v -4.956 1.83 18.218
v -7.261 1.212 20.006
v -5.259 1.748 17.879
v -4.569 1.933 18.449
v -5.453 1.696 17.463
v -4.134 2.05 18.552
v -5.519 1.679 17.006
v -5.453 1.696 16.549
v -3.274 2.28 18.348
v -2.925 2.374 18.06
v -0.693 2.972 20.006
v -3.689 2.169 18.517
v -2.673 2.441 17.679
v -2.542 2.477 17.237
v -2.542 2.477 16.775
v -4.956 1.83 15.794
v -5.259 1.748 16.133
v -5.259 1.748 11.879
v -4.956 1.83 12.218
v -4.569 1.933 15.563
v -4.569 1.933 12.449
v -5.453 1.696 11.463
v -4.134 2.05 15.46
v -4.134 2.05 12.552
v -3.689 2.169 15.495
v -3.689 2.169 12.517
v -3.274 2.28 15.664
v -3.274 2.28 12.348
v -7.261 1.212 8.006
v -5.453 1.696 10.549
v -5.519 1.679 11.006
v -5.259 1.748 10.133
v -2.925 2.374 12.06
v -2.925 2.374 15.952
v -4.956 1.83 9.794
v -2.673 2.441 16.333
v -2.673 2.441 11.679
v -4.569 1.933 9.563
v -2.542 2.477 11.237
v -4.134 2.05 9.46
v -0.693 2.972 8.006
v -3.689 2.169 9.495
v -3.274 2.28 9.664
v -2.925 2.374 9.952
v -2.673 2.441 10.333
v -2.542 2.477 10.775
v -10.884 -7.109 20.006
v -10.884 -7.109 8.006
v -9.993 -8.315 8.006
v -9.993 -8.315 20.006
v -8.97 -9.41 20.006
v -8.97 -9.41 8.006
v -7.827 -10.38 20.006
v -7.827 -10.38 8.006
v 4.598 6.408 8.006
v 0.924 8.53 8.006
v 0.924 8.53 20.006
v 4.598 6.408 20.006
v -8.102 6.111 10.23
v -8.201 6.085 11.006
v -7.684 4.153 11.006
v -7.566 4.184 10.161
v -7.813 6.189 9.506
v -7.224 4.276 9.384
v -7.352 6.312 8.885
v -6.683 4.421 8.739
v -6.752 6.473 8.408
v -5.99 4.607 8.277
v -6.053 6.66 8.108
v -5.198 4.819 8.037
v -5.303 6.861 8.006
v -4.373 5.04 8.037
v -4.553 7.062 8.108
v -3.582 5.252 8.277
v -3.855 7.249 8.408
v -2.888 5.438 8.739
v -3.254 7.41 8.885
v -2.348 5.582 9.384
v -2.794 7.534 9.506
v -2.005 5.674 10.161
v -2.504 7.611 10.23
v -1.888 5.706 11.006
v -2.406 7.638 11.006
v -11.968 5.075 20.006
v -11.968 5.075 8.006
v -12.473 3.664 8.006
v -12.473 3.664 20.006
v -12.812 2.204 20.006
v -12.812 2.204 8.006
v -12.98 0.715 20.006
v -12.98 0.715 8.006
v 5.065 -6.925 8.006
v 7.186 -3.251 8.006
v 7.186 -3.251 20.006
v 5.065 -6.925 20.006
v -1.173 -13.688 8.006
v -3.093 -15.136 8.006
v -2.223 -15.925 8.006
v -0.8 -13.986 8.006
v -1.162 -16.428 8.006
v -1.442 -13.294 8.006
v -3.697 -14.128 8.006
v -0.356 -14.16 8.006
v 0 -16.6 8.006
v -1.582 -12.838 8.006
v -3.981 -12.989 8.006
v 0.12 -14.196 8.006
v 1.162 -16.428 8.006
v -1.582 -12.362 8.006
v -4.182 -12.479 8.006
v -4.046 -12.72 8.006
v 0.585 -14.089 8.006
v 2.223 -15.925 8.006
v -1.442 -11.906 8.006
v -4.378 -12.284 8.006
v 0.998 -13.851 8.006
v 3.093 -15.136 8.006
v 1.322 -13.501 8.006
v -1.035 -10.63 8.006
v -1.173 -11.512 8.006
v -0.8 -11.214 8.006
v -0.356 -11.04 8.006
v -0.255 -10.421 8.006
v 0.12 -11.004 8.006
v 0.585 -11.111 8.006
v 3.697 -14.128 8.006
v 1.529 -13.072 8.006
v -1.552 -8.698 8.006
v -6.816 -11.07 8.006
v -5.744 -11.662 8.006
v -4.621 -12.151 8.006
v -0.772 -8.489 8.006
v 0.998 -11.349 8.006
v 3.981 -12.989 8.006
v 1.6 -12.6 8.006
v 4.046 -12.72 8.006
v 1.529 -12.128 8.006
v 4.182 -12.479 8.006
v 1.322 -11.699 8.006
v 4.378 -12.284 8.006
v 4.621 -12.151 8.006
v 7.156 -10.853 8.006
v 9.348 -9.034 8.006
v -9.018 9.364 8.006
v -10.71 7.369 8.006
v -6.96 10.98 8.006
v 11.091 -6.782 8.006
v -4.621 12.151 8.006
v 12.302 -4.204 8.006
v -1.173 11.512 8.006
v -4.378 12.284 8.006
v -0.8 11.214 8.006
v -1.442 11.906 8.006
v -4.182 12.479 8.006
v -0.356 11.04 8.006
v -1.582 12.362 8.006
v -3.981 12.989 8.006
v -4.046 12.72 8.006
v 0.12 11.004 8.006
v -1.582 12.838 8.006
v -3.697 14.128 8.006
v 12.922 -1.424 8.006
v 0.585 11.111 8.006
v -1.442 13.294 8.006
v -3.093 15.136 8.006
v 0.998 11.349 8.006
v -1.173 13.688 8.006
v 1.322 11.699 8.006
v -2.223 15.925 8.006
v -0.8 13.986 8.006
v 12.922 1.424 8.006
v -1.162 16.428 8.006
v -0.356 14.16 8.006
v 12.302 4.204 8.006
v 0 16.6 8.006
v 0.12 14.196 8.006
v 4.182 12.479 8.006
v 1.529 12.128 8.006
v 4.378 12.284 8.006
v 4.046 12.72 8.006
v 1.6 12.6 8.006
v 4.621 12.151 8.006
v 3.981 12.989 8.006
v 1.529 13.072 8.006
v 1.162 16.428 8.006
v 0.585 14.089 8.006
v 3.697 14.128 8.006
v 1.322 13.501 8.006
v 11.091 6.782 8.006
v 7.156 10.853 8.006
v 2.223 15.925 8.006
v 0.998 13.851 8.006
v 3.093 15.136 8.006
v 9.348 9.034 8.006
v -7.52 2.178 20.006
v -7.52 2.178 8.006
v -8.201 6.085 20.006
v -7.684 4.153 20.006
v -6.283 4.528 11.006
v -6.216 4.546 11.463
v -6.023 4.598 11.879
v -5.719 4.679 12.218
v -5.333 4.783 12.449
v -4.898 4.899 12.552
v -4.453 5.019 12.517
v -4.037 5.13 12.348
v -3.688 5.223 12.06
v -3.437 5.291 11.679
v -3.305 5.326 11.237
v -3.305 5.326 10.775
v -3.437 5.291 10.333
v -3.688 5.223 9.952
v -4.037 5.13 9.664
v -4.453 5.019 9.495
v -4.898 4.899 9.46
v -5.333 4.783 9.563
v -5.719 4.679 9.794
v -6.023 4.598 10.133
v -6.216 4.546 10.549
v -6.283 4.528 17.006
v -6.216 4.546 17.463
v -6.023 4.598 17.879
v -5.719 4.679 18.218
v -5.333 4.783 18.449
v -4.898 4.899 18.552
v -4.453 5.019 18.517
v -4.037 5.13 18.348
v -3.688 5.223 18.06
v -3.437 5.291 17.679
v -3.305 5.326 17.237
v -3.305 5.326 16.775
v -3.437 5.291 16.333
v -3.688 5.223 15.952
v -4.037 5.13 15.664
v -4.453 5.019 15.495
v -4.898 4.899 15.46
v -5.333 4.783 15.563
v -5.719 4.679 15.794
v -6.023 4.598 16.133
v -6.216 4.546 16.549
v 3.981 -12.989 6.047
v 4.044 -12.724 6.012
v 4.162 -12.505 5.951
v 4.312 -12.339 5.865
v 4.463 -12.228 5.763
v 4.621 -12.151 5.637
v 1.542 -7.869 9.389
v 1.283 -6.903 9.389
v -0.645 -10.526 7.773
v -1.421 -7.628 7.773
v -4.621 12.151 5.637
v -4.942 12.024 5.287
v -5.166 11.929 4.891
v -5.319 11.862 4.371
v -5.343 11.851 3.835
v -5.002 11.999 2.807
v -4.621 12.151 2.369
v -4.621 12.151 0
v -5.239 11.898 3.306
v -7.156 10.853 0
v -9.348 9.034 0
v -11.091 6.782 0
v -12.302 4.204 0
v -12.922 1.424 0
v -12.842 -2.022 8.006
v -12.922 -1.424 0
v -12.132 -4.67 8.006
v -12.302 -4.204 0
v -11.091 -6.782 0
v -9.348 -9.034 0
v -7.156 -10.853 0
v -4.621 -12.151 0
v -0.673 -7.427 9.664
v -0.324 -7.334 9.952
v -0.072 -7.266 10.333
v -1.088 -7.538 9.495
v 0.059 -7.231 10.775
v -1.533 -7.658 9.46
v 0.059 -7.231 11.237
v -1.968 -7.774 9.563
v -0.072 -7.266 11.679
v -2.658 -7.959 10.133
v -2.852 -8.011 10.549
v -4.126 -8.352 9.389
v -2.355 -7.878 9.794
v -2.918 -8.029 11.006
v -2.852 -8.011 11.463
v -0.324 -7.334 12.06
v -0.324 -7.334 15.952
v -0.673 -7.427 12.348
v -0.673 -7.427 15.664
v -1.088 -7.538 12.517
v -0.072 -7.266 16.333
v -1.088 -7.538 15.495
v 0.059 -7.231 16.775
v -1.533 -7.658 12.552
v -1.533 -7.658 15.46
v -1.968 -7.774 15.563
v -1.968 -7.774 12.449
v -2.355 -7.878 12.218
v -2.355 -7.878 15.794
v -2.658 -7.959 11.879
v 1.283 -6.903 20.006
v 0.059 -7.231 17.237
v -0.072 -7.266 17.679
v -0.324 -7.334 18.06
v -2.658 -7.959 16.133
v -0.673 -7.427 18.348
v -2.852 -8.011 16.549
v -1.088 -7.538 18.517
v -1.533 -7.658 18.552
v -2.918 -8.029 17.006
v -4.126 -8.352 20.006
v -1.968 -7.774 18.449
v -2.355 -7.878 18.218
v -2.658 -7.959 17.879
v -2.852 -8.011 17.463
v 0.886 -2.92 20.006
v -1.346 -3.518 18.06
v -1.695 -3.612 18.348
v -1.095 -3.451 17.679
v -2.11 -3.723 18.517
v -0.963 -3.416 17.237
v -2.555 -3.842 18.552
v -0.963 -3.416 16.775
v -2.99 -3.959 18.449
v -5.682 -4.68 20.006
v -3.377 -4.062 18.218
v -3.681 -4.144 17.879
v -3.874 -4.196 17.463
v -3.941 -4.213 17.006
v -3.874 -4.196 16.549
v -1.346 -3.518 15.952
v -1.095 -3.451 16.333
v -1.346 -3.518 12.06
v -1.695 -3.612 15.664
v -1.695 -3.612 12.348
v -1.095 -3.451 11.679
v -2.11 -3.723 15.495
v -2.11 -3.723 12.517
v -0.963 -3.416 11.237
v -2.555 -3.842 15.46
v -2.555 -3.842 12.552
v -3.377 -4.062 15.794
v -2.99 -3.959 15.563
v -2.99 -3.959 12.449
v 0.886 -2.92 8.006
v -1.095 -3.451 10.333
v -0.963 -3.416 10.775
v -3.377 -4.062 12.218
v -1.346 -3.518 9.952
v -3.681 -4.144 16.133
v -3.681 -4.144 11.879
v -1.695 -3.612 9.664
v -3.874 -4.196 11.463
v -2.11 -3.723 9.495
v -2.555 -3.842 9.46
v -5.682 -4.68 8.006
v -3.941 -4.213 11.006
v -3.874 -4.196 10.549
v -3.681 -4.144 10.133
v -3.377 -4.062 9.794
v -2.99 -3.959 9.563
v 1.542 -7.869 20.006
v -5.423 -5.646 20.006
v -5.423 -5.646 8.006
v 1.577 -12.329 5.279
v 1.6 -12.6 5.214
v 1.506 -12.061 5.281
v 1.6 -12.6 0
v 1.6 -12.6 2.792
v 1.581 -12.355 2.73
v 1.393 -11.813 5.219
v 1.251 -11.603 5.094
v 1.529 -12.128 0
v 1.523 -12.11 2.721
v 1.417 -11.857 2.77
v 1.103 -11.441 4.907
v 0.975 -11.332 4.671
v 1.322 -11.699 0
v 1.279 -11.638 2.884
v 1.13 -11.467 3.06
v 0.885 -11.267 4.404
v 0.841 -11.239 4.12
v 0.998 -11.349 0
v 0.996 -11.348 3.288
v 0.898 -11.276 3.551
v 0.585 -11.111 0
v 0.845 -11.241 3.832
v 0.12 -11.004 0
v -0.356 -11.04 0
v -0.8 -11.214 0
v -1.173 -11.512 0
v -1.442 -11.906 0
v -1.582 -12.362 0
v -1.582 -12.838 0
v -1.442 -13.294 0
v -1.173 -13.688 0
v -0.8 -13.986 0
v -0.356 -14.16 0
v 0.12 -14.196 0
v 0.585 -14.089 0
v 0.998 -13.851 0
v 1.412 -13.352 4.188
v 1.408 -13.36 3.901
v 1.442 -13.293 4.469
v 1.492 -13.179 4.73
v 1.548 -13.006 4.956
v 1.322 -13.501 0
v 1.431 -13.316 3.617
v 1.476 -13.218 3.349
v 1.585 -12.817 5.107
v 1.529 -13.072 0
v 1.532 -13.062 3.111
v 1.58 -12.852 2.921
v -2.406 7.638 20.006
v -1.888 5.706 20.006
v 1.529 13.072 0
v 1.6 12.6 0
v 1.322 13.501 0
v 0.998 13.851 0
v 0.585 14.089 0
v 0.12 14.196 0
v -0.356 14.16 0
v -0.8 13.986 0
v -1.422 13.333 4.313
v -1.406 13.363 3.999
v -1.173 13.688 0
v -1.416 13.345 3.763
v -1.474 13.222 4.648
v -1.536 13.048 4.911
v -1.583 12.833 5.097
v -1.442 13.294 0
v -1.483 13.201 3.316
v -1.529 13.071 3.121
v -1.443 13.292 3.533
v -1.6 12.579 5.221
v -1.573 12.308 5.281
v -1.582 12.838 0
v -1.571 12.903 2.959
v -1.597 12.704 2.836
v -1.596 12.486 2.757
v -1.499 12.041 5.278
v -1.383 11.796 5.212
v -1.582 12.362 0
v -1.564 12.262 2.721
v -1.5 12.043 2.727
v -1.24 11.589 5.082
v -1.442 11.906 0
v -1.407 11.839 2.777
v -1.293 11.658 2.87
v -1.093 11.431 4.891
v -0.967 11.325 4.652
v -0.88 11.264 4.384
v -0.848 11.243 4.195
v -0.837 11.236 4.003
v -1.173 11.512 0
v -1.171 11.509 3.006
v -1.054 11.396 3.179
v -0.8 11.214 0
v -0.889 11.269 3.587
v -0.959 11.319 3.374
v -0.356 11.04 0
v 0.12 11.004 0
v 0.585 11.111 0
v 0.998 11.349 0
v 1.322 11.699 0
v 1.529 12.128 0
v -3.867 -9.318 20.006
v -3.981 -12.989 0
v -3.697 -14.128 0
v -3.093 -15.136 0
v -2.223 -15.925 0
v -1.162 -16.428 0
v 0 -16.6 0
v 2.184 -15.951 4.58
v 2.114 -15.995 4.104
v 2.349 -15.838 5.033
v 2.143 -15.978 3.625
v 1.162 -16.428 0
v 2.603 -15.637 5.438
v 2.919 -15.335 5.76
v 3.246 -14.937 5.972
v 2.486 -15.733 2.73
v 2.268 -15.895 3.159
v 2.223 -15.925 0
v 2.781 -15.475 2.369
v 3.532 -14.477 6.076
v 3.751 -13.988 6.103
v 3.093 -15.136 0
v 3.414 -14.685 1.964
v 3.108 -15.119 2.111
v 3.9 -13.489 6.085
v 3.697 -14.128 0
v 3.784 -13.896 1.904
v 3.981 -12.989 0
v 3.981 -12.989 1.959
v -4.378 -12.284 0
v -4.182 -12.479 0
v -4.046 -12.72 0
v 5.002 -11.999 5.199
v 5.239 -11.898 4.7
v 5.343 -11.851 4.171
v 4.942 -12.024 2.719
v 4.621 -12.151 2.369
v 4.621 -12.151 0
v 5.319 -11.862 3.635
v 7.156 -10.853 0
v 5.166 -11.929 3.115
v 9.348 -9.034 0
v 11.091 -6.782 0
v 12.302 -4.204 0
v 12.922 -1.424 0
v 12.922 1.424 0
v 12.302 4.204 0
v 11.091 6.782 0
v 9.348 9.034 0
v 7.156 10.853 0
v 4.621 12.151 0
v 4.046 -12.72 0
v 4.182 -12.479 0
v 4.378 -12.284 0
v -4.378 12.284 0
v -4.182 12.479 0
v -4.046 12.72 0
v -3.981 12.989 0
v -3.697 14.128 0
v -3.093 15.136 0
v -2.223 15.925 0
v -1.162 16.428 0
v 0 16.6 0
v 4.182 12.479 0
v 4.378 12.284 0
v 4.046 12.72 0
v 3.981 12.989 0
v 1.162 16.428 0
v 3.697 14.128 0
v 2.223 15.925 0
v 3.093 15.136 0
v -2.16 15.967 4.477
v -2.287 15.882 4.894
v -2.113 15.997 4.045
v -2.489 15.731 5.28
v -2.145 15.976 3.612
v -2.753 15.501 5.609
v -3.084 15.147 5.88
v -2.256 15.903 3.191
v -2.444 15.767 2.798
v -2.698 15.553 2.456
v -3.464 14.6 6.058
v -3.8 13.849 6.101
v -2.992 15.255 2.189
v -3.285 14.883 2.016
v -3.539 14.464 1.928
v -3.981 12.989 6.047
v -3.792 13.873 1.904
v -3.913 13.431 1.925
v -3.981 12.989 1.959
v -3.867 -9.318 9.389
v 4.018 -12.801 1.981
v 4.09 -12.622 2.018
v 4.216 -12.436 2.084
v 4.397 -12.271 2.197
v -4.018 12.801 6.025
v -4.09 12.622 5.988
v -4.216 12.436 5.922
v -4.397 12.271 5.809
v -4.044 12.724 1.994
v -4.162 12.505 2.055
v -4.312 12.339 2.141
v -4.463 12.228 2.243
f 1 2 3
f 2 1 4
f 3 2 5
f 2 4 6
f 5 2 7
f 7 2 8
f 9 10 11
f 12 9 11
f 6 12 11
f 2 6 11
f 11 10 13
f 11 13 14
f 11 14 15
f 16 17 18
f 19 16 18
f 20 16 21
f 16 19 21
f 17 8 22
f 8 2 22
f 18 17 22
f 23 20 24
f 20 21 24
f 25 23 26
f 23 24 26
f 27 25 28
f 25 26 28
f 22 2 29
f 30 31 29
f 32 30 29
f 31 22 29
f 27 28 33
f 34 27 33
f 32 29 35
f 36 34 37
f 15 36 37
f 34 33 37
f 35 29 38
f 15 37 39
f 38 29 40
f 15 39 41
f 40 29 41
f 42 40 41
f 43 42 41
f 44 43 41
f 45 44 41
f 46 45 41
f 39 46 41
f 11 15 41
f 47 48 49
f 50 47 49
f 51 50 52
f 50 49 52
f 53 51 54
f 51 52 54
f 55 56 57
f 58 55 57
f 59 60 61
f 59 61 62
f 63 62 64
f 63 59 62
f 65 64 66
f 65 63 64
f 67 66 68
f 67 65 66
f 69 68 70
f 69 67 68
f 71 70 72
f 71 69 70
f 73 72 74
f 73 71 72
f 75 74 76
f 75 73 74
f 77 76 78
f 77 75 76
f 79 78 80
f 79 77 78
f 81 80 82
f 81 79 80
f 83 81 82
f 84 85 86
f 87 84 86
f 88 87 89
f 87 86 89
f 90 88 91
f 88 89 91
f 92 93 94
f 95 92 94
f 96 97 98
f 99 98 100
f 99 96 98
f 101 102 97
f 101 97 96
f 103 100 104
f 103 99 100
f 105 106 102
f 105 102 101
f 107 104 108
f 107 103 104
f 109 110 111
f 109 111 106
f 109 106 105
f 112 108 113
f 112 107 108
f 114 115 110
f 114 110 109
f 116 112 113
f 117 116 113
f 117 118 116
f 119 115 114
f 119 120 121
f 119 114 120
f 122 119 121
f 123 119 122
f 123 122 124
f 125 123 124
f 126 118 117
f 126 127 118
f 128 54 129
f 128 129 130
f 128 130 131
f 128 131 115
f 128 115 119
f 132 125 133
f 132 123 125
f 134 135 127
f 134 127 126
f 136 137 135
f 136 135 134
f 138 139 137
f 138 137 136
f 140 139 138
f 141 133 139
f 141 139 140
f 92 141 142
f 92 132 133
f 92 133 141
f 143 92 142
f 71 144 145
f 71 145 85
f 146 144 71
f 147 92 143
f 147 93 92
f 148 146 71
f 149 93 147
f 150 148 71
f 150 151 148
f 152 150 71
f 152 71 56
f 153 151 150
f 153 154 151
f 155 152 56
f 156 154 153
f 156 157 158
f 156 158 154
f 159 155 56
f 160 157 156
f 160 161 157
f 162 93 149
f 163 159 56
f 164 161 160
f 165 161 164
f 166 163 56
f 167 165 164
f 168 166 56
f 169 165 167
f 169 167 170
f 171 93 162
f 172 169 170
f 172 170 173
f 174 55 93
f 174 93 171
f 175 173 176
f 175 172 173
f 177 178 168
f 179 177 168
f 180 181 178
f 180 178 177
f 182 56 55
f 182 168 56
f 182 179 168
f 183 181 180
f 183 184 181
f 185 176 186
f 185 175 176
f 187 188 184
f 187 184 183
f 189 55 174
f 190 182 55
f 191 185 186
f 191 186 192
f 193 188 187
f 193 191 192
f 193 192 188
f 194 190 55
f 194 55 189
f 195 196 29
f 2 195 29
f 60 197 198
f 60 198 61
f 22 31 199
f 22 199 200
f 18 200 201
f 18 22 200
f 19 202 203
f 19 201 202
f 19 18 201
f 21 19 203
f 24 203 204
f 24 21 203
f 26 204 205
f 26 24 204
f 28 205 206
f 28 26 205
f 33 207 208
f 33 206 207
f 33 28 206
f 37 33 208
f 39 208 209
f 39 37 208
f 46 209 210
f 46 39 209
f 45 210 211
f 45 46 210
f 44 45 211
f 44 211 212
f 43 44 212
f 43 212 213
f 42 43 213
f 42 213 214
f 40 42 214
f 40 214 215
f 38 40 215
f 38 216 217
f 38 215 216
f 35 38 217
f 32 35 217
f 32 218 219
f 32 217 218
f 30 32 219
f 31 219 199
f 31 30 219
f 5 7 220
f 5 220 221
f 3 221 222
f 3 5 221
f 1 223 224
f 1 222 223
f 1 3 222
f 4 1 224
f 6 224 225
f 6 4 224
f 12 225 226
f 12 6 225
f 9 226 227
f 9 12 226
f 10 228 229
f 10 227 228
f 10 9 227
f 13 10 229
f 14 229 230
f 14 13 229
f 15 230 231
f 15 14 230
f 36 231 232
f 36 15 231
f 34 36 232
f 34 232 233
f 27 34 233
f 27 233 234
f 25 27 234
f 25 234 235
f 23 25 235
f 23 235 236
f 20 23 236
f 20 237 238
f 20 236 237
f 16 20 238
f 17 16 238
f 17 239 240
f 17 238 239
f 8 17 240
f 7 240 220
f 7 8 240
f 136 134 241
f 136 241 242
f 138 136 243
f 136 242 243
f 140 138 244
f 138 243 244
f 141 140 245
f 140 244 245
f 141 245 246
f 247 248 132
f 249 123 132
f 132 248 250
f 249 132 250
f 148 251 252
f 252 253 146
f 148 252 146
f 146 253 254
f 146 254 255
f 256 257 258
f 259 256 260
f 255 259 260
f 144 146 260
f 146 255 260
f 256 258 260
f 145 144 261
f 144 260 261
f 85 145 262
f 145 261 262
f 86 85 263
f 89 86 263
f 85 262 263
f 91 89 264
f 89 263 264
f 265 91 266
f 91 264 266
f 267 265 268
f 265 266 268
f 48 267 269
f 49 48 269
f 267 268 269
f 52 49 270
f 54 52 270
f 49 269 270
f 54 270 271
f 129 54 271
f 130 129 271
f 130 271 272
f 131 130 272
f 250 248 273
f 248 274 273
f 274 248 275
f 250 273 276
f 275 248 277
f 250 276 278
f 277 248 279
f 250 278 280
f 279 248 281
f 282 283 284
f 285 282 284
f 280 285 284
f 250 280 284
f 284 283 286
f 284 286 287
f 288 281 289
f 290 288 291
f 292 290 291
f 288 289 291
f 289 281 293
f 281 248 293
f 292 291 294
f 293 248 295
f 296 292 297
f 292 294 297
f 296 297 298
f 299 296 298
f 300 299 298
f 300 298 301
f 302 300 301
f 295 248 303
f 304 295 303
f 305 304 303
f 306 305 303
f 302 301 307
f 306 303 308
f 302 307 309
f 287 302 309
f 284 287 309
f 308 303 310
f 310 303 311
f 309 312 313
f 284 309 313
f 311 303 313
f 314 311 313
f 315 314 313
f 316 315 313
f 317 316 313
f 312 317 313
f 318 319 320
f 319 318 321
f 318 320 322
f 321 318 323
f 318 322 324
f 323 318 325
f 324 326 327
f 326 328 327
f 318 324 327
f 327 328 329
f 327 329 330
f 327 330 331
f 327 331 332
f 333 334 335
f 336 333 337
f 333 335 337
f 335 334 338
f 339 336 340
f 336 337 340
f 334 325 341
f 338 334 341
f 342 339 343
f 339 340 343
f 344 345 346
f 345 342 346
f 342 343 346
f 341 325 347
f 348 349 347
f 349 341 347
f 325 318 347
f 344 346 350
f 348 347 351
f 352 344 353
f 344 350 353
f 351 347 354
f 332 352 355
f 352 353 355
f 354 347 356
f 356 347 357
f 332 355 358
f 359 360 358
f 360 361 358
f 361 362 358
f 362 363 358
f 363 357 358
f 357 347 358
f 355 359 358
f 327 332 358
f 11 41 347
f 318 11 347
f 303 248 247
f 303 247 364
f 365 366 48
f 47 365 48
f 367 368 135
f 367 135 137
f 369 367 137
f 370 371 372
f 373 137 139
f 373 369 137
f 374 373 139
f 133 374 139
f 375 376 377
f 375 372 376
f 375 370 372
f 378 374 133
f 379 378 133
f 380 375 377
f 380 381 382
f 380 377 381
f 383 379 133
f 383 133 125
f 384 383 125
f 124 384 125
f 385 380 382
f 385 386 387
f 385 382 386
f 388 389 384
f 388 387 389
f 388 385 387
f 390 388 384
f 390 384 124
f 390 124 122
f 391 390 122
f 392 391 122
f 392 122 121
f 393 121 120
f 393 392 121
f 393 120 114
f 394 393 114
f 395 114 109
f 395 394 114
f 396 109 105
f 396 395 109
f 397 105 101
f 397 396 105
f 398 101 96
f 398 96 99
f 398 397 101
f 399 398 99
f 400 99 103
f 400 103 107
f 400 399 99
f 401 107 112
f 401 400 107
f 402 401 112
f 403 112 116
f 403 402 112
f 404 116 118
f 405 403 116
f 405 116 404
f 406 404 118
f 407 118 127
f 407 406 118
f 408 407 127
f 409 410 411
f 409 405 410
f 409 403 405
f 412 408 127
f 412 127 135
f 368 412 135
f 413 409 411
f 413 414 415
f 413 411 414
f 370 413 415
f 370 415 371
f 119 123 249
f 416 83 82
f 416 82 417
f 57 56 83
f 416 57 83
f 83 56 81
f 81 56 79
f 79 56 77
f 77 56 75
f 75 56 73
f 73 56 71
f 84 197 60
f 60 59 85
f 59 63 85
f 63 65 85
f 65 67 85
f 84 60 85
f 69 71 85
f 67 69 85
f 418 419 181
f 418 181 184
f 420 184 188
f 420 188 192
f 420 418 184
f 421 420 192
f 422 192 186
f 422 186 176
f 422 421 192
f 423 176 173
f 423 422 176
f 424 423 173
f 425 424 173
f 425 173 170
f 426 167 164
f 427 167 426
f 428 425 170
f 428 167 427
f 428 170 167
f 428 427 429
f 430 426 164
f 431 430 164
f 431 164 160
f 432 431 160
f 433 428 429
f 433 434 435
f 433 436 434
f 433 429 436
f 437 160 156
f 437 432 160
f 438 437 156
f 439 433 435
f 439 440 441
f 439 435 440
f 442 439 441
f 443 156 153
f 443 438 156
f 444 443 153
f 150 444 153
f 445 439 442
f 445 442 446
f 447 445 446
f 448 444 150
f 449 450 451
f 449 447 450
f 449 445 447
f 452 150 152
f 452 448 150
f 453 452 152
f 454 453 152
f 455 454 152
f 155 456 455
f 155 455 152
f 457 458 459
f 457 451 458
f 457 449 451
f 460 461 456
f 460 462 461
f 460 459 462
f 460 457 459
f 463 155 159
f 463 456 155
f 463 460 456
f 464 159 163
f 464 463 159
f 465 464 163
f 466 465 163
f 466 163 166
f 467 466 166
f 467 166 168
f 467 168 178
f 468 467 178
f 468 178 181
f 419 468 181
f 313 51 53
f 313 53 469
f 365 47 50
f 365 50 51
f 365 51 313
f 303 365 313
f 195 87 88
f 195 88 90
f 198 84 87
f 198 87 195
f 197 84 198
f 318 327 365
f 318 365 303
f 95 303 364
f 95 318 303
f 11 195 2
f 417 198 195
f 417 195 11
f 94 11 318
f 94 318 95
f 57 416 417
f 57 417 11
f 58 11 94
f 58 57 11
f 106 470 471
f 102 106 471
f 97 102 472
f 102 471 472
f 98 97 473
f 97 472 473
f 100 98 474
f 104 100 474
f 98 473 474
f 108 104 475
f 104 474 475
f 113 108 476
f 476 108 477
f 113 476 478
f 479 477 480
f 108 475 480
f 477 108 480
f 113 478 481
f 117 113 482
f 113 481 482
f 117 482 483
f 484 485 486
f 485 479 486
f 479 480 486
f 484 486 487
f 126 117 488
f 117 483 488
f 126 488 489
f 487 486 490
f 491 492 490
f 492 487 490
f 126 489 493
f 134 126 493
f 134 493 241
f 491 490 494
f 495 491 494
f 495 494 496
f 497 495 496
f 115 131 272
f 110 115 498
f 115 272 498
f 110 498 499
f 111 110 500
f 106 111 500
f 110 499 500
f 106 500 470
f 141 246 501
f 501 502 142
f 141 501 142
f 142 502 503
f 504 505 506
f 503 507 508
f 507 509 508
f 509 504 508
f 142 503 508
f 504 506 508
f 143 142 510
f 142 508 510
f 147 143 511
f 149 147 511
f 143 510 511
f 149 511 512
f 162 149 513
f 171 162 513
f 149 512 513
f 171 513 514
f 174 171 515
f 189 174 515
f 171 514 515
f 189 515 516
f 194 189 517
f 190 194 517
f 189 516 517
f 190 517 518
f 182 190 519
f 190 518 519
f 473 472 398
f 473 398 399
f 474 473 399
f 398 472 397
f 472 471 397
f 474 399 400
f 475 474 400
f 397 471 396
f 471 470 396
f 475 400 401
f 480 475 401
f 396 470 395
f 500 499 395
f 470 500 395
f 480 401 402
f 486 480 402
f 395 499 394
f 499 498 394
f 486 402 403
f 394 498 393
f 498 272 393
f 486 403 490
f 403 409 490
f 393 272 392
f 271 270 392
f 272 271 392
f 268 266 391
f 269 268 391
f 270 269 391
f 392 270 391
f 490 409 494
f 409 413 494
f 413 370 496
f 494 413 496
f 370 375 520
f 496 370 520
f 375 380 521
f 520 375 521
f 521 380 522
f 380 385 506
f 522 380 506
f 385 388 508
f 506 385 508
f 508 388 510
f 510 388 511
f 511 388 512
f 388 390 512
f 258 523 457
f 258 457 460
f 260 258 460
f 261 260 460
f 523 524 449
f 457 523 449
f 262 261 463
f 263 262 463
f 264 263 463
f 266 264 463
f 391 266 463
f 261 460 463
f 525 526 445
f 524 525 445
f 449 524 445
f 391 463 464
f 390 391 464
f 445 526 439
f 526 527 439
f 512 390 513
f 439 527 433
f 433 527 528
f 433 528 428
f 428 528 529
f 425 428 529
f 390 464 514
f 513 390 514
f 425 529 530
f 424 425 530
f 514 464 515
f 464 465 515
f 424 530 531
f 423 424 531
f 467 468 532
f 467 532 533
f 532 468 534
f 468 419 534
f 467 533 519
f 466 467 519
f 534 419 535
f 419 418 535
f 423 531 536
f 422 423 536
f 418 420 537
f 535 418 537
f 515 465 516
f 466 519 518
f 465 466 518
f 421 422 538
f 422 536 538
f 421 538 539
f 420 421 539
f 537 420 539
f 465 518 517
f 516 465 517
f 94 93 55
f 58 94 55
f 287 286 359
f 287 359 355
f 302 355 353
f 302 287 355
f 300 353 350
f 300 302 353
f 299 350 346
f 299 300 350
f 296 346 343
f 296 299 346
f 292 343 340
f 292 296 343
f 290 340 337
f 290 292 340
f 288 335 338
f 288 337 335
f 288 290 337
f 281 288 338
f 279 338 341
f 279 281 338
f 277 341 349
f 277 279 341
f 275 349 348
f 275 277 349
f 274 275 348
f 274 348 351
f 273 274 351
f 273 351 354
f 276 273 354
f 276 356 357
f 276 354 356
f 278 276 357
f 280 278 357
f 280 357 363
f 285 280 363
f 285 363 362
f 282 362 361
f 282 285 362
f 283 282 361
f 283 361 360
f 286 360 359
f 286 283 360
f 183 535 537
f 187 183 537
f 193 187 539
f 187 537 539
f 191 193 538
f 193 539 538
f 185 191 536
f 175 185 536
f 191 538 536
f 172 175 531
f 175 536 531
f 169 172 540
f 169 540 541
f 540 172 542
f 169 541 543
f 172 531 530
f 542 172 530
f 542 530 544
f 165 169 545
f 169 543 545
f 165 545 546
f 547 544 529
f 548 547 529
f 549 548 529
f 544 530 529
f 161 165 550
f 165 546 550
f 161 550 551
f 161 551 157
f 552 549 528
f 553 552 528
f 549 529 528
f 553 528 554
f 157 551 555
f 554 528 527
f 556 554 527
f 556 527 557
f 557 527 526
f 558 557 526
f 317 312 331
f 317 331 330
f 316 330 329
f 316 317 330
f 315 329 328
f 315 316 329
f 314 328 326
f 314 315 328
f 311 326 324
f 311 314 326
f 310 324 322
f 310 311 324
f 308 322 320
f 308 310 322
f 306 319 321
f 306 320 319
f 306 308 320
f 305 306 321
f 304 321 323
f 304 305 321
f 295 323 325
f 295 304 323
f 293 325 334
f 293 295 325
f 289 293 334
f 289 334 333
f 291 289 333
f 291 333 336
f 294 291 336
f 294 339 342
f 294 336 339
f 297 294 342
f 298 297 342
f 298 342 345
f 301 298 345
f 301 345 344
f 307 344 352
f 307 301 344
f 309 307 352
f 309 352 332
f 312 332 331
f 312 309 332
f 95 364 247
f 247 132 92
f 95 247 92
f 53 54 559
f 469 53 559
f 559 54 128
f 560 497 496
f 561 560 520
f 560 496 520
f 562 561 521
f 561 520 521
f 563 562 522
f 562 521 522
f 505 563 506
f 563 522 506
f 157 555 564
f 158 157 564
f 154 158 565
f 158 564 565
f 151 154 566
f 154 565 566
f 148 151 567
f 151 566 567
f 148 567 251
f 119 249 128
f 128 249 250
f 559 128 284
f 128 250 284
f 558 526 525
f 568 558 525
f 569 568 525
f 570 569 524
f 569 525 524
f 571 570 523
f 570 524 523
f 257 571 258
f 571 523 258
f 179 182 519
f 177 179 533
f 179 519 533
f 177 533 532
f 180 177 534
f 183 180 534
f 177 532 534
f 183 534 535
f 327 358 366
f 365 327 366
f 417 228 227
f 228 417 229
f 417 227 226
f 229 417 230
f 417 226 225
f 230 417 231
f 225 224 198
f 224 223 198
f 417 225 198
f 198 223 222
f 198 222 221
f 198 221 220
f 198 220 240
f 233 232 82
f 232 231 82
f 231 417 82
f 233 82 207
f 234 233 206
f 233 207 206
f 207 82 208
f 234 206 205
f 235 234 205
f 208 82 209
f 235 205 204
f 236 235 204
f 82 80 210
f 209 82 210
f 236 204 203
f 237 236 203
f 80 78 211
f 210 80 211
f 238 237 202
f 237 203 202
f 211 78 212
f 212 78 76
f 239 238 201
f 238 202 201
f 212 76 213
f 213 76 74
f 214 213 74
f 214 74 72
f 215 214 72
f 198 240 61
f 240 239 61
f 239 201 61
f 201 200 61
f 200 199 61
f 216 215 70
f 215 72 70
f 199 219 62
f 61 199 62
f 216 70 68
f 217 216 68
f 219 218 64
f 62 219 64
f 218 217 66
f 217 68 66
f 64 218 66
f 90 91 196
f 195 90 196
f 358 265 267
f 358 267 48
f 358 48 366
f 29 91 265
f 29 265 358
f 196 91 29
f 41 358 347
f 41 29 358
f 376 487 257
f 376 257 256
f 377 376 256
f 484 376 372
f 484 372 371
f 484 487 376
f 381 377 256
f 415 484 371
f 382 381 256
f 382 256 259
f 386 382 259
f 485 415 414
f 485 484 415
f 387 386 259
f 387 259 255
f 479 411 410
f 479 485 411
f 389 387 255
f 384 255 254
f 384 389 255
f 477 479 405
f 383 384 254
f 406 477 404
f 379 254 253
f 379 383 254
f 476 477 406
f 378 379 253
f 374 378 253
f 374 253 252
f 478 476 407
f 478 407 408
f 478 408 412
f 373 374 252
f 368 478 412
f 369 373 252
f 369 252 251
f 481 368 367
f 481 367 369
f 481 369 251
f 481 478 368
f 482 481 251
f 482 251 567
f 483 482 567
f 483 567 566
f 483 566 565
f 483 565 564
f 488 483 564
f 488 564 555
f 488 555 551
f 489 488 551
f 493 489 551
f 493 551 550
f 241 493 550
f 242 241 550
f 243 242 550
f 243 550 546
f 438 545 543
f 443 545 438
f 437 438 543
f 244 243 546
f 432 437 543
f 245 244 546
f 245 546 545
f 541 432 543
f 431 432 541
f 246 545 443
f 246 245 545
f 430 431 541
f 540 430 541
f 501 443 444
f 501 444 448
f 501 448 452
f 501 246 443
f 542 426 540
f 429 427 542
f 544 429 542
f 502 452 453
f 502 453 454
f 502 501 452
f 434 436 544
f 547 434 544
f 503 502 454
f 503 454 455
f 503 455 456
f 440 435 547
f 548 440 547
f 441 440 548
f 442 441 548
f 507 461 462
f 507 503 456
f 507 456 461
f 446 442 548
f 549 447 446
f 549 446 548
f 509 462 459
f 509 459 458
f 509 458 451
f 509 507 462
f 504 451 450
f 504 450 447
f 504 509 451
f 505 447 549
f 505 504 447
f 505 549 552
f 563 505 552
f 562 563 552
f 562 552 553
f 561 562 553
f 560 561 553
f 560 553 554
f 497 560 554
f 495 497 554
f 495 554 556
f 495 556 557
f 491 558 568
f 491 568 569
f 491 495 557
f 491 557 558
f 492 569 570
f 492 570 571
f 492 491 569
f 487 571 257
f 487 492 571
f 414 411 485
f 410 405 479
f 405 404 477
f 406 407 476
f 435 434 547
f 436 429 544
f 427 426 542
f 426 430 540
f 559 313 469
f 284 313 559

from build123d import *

# Parameters (mm, degrees)
SKETCH1_R               = 1.6
BOSS_EXTRUDE1_DEPTH     = 8.00600005
CUT_EXTRUDE1_DEPTH      = 23.553404107
CUT_EXTRUDE1_DEPTH_BACK = 23.553404107
SKETCH3_R               = 2.1
BOSS_EXTRUDE2_DEPTH     = 12
CHAMFER1_SIZE           = 3
CUT_EXTRUDE4_DEPTH      = 35.916819883
CUT_EXTRUDE4_DEPTH_BACK = 35.916819883
SKETCH7_R               = 1.55
CUT_EXTRUDE5_DEPTH      = 2
CUT_EXTRUDE5_DEPTH_BACK = 1
CUT_EXTRUDE6_DEPTH      = 2


with BuildPart() as part:
    # Sketch1 → Boss-Extrude1 (new body)
    with BuildSketch(Plane.XY):
        with BuildLine():
            ThreePointArc((4.62089851, -12.151020408), (13, 0), (4.62089851, 12.151020408))
            ThreePointArc((4.62089851, 12.151020408), (4.181690754, 12.478661471), (3.981081793, 12.988571429))
            ThreePointArc((3.981081793, 12.988571429), (0, 16.6), (-3.981081793, 12.988571429))
            ThreePointArc((-3.981081793, 12.988571429), (-4.181690754, 12.478661471), (-4.62089851, 12.151020408))
            ThreePointArc((-4.62089851, 12.151020408), (-13, 0), (-4.62089851, -12.151020408))
            ThreePointArc((-4.62089851, -12.151020408), (-4.181690754, -12.478661471), (-3.981081793, -12.988571429))
            ThreePointArc((-3.981081793, -12.988571429), (0, -16.6), (3.981081793, -12.988571429))
            ThreePointArc((3.981081793, -12.988571429), (4.181690754, -12.478661471), (4.62089851, -12.151020408))
        make_face()
        with Locations((0, 12.6)):
            Circle(SKETCH1_R, mode=Mode.SUBTRACT)
        with Locations((0, -12.6)):
            Circle(SKETCH1_R, mode=Mode.SUBTRACT)
    extrude(amount=BOSS_EXTRUDE1_DEPTH)

    # Sketch3 → Cut-Extrude1 (cut, two sides: drawn at the far end of the back side and taken through both)
    with BuildSketch(Plane(origin=(0, 0, 0), x_dir=(0, 0, 1), z_dir=(-0.25881904510252135, 0.9659258262890681, 0)).offset(-CUT_EXTRUDE1_DEPTH_BACK)):
        with Locations((4.003000025, 0)):
            Circle(SKETCH3_R)
    extrude(amount=CUT_EXTRUDE1_DEPTH + CUT_EXTRUDE1_DEPTH_BACK, mode=Mode.SUBTRACT)

    # Sketch6 → Boss-Extrude2 (add)
    with BuildSketch(Plane.XY.offset(8.00600005)):
        with BuildLine():
            Line((-7.827242025, -10.379512623), (7.962699901, -6.148610435))
            Line((7.962699901, -6.148610435), (3.82159518, 9.306202785))
            Line((3.82159518, 9.306202785), (-11.968346746, 5.075300598))
            ThreePointArc((-11.968346746, 5.075300598), (-12.66343786, 2.938935449), (-12.9803337, 0.714798598))
            Line((-12.9803337, 0.714798598), (-7.519920169, 2.177911994))
            Line((-7.519920169, 2.177911994), (-7.261101124, 1.211986168))
            Line((-7.261101124, 1.211986168), (-0.692805505, 2.971955675))
            Line((-0.692805505, 2.971955675), (0.88599067, -2.920191866))
            Line((0.88599067, -2.920191866), (-5.682304949, -4.680161372))
            Line((-5.682304949, -4.680161372), (-5.423485903, -5.646087199))
            Line((-5.423485903, -5.646087199), (-10.883899435, -7.109200595))
            ThreePointArc((-10.883899435, -7.109200595), (-9.497391161, -8.876911689), (-7.827242025, -10.379512623))
        make_face()
    extrude(amount=BOSS_EXTRUDE2_DEPTH)

    # Chamfer1
    chamfer1_edges = [part.edges().sort_by_distance(p)[0] for p in [
        (7.962699901, -6.148610435, 14.00600005),
        (3.82159518, 9.306202785, 14.00600005),
    ]]
    chamfer(chamfer1_edges, length=CHAMFER1_SIZE)

    # Sketch7 → Cut-Extrude4 (cut, two sides: drawn at the far end of the back side and taken through both)
    with BuildSketch(Plane(origin=(-2.070552361, 7.72740661, 0), x_dir=(0.9659258262890701, 0.2588190451025142, 0), z_dir=(-0.2588190451025142, 0.9659258262890701, 0)).offset(-CUT_EXTRUDE4_DEPTH_BACK)):
        with Locations((-3.346950766, -17.00600005)):
            Circle(SKETCH7_R)
        with Locations((-3.346950766, -11.00600005)):
            Circle(SKETCH7_R)
    extrude(amount=CUT_EXTRUDE4_DEPTH + CUT_EXTRUDE4_DEPTH_BACK, mode=Mode.SUBTRACT)

    # Sketch8 → Cut-Extrude5 (cut, two sides: drawn at the far end of the back side and taken through both)
    with BuildSketch(Plane(origin=(2.070552361, -7.72740661, 0), x_dir=(0.9659258262890699, 0.25881904510251513, 0), z_dir=(0.2588190451025151, -0.9659258262890698, 0)).offset(-CUT_EXTRUDE5_DEPTH_BACK)):
        Polygon((-6.146950766, 12.622580803), (-6.146950766, 20.00600005), (-0.546950766, 20.00600005), (-0.546950766, 12.622580803), (-0.546950766, 9.389419296), (-3.346950766, 7.772838542), (-6.146950766, 9.389419296), align=None)
    extrude(amount=CUT_EXTRUDE5_DEPTH + CUT_EXTRUDE5_DEPTH_BACK, mode=Mode.SUBTRACT)

    # Sketch9 → Cut-Extrude6 (cut)
    with BuildSketch(Plane(origin=(-2.070552361, 7.72740661, 0), x_dir=(0.9659258262890701, 0.2588190451025142, 0), z_dir=(-0.2588190451025142, 0.9659258262890701, 0))):
        with BuildLine():
            Line((-6.346950766, -20.00600005), (-6.346950766, -11.00600005))
            ThreePointArc((-6.346950766, -11.00600005), (-3.346950766, -8.00600005), (-0.346950766, -11.00600005))
            Line((-0.346950766, -11.00600005), (-0.346950766, -20.00600005))
            Line((-0.346950766, -20.00600005), (-6.346950766, -20.00600005))
        make_face()
    extrude(amount=-CUT_EXTRUDE6_DEPTH, mode=Mode.SUBTRACT)


solid = part.part
